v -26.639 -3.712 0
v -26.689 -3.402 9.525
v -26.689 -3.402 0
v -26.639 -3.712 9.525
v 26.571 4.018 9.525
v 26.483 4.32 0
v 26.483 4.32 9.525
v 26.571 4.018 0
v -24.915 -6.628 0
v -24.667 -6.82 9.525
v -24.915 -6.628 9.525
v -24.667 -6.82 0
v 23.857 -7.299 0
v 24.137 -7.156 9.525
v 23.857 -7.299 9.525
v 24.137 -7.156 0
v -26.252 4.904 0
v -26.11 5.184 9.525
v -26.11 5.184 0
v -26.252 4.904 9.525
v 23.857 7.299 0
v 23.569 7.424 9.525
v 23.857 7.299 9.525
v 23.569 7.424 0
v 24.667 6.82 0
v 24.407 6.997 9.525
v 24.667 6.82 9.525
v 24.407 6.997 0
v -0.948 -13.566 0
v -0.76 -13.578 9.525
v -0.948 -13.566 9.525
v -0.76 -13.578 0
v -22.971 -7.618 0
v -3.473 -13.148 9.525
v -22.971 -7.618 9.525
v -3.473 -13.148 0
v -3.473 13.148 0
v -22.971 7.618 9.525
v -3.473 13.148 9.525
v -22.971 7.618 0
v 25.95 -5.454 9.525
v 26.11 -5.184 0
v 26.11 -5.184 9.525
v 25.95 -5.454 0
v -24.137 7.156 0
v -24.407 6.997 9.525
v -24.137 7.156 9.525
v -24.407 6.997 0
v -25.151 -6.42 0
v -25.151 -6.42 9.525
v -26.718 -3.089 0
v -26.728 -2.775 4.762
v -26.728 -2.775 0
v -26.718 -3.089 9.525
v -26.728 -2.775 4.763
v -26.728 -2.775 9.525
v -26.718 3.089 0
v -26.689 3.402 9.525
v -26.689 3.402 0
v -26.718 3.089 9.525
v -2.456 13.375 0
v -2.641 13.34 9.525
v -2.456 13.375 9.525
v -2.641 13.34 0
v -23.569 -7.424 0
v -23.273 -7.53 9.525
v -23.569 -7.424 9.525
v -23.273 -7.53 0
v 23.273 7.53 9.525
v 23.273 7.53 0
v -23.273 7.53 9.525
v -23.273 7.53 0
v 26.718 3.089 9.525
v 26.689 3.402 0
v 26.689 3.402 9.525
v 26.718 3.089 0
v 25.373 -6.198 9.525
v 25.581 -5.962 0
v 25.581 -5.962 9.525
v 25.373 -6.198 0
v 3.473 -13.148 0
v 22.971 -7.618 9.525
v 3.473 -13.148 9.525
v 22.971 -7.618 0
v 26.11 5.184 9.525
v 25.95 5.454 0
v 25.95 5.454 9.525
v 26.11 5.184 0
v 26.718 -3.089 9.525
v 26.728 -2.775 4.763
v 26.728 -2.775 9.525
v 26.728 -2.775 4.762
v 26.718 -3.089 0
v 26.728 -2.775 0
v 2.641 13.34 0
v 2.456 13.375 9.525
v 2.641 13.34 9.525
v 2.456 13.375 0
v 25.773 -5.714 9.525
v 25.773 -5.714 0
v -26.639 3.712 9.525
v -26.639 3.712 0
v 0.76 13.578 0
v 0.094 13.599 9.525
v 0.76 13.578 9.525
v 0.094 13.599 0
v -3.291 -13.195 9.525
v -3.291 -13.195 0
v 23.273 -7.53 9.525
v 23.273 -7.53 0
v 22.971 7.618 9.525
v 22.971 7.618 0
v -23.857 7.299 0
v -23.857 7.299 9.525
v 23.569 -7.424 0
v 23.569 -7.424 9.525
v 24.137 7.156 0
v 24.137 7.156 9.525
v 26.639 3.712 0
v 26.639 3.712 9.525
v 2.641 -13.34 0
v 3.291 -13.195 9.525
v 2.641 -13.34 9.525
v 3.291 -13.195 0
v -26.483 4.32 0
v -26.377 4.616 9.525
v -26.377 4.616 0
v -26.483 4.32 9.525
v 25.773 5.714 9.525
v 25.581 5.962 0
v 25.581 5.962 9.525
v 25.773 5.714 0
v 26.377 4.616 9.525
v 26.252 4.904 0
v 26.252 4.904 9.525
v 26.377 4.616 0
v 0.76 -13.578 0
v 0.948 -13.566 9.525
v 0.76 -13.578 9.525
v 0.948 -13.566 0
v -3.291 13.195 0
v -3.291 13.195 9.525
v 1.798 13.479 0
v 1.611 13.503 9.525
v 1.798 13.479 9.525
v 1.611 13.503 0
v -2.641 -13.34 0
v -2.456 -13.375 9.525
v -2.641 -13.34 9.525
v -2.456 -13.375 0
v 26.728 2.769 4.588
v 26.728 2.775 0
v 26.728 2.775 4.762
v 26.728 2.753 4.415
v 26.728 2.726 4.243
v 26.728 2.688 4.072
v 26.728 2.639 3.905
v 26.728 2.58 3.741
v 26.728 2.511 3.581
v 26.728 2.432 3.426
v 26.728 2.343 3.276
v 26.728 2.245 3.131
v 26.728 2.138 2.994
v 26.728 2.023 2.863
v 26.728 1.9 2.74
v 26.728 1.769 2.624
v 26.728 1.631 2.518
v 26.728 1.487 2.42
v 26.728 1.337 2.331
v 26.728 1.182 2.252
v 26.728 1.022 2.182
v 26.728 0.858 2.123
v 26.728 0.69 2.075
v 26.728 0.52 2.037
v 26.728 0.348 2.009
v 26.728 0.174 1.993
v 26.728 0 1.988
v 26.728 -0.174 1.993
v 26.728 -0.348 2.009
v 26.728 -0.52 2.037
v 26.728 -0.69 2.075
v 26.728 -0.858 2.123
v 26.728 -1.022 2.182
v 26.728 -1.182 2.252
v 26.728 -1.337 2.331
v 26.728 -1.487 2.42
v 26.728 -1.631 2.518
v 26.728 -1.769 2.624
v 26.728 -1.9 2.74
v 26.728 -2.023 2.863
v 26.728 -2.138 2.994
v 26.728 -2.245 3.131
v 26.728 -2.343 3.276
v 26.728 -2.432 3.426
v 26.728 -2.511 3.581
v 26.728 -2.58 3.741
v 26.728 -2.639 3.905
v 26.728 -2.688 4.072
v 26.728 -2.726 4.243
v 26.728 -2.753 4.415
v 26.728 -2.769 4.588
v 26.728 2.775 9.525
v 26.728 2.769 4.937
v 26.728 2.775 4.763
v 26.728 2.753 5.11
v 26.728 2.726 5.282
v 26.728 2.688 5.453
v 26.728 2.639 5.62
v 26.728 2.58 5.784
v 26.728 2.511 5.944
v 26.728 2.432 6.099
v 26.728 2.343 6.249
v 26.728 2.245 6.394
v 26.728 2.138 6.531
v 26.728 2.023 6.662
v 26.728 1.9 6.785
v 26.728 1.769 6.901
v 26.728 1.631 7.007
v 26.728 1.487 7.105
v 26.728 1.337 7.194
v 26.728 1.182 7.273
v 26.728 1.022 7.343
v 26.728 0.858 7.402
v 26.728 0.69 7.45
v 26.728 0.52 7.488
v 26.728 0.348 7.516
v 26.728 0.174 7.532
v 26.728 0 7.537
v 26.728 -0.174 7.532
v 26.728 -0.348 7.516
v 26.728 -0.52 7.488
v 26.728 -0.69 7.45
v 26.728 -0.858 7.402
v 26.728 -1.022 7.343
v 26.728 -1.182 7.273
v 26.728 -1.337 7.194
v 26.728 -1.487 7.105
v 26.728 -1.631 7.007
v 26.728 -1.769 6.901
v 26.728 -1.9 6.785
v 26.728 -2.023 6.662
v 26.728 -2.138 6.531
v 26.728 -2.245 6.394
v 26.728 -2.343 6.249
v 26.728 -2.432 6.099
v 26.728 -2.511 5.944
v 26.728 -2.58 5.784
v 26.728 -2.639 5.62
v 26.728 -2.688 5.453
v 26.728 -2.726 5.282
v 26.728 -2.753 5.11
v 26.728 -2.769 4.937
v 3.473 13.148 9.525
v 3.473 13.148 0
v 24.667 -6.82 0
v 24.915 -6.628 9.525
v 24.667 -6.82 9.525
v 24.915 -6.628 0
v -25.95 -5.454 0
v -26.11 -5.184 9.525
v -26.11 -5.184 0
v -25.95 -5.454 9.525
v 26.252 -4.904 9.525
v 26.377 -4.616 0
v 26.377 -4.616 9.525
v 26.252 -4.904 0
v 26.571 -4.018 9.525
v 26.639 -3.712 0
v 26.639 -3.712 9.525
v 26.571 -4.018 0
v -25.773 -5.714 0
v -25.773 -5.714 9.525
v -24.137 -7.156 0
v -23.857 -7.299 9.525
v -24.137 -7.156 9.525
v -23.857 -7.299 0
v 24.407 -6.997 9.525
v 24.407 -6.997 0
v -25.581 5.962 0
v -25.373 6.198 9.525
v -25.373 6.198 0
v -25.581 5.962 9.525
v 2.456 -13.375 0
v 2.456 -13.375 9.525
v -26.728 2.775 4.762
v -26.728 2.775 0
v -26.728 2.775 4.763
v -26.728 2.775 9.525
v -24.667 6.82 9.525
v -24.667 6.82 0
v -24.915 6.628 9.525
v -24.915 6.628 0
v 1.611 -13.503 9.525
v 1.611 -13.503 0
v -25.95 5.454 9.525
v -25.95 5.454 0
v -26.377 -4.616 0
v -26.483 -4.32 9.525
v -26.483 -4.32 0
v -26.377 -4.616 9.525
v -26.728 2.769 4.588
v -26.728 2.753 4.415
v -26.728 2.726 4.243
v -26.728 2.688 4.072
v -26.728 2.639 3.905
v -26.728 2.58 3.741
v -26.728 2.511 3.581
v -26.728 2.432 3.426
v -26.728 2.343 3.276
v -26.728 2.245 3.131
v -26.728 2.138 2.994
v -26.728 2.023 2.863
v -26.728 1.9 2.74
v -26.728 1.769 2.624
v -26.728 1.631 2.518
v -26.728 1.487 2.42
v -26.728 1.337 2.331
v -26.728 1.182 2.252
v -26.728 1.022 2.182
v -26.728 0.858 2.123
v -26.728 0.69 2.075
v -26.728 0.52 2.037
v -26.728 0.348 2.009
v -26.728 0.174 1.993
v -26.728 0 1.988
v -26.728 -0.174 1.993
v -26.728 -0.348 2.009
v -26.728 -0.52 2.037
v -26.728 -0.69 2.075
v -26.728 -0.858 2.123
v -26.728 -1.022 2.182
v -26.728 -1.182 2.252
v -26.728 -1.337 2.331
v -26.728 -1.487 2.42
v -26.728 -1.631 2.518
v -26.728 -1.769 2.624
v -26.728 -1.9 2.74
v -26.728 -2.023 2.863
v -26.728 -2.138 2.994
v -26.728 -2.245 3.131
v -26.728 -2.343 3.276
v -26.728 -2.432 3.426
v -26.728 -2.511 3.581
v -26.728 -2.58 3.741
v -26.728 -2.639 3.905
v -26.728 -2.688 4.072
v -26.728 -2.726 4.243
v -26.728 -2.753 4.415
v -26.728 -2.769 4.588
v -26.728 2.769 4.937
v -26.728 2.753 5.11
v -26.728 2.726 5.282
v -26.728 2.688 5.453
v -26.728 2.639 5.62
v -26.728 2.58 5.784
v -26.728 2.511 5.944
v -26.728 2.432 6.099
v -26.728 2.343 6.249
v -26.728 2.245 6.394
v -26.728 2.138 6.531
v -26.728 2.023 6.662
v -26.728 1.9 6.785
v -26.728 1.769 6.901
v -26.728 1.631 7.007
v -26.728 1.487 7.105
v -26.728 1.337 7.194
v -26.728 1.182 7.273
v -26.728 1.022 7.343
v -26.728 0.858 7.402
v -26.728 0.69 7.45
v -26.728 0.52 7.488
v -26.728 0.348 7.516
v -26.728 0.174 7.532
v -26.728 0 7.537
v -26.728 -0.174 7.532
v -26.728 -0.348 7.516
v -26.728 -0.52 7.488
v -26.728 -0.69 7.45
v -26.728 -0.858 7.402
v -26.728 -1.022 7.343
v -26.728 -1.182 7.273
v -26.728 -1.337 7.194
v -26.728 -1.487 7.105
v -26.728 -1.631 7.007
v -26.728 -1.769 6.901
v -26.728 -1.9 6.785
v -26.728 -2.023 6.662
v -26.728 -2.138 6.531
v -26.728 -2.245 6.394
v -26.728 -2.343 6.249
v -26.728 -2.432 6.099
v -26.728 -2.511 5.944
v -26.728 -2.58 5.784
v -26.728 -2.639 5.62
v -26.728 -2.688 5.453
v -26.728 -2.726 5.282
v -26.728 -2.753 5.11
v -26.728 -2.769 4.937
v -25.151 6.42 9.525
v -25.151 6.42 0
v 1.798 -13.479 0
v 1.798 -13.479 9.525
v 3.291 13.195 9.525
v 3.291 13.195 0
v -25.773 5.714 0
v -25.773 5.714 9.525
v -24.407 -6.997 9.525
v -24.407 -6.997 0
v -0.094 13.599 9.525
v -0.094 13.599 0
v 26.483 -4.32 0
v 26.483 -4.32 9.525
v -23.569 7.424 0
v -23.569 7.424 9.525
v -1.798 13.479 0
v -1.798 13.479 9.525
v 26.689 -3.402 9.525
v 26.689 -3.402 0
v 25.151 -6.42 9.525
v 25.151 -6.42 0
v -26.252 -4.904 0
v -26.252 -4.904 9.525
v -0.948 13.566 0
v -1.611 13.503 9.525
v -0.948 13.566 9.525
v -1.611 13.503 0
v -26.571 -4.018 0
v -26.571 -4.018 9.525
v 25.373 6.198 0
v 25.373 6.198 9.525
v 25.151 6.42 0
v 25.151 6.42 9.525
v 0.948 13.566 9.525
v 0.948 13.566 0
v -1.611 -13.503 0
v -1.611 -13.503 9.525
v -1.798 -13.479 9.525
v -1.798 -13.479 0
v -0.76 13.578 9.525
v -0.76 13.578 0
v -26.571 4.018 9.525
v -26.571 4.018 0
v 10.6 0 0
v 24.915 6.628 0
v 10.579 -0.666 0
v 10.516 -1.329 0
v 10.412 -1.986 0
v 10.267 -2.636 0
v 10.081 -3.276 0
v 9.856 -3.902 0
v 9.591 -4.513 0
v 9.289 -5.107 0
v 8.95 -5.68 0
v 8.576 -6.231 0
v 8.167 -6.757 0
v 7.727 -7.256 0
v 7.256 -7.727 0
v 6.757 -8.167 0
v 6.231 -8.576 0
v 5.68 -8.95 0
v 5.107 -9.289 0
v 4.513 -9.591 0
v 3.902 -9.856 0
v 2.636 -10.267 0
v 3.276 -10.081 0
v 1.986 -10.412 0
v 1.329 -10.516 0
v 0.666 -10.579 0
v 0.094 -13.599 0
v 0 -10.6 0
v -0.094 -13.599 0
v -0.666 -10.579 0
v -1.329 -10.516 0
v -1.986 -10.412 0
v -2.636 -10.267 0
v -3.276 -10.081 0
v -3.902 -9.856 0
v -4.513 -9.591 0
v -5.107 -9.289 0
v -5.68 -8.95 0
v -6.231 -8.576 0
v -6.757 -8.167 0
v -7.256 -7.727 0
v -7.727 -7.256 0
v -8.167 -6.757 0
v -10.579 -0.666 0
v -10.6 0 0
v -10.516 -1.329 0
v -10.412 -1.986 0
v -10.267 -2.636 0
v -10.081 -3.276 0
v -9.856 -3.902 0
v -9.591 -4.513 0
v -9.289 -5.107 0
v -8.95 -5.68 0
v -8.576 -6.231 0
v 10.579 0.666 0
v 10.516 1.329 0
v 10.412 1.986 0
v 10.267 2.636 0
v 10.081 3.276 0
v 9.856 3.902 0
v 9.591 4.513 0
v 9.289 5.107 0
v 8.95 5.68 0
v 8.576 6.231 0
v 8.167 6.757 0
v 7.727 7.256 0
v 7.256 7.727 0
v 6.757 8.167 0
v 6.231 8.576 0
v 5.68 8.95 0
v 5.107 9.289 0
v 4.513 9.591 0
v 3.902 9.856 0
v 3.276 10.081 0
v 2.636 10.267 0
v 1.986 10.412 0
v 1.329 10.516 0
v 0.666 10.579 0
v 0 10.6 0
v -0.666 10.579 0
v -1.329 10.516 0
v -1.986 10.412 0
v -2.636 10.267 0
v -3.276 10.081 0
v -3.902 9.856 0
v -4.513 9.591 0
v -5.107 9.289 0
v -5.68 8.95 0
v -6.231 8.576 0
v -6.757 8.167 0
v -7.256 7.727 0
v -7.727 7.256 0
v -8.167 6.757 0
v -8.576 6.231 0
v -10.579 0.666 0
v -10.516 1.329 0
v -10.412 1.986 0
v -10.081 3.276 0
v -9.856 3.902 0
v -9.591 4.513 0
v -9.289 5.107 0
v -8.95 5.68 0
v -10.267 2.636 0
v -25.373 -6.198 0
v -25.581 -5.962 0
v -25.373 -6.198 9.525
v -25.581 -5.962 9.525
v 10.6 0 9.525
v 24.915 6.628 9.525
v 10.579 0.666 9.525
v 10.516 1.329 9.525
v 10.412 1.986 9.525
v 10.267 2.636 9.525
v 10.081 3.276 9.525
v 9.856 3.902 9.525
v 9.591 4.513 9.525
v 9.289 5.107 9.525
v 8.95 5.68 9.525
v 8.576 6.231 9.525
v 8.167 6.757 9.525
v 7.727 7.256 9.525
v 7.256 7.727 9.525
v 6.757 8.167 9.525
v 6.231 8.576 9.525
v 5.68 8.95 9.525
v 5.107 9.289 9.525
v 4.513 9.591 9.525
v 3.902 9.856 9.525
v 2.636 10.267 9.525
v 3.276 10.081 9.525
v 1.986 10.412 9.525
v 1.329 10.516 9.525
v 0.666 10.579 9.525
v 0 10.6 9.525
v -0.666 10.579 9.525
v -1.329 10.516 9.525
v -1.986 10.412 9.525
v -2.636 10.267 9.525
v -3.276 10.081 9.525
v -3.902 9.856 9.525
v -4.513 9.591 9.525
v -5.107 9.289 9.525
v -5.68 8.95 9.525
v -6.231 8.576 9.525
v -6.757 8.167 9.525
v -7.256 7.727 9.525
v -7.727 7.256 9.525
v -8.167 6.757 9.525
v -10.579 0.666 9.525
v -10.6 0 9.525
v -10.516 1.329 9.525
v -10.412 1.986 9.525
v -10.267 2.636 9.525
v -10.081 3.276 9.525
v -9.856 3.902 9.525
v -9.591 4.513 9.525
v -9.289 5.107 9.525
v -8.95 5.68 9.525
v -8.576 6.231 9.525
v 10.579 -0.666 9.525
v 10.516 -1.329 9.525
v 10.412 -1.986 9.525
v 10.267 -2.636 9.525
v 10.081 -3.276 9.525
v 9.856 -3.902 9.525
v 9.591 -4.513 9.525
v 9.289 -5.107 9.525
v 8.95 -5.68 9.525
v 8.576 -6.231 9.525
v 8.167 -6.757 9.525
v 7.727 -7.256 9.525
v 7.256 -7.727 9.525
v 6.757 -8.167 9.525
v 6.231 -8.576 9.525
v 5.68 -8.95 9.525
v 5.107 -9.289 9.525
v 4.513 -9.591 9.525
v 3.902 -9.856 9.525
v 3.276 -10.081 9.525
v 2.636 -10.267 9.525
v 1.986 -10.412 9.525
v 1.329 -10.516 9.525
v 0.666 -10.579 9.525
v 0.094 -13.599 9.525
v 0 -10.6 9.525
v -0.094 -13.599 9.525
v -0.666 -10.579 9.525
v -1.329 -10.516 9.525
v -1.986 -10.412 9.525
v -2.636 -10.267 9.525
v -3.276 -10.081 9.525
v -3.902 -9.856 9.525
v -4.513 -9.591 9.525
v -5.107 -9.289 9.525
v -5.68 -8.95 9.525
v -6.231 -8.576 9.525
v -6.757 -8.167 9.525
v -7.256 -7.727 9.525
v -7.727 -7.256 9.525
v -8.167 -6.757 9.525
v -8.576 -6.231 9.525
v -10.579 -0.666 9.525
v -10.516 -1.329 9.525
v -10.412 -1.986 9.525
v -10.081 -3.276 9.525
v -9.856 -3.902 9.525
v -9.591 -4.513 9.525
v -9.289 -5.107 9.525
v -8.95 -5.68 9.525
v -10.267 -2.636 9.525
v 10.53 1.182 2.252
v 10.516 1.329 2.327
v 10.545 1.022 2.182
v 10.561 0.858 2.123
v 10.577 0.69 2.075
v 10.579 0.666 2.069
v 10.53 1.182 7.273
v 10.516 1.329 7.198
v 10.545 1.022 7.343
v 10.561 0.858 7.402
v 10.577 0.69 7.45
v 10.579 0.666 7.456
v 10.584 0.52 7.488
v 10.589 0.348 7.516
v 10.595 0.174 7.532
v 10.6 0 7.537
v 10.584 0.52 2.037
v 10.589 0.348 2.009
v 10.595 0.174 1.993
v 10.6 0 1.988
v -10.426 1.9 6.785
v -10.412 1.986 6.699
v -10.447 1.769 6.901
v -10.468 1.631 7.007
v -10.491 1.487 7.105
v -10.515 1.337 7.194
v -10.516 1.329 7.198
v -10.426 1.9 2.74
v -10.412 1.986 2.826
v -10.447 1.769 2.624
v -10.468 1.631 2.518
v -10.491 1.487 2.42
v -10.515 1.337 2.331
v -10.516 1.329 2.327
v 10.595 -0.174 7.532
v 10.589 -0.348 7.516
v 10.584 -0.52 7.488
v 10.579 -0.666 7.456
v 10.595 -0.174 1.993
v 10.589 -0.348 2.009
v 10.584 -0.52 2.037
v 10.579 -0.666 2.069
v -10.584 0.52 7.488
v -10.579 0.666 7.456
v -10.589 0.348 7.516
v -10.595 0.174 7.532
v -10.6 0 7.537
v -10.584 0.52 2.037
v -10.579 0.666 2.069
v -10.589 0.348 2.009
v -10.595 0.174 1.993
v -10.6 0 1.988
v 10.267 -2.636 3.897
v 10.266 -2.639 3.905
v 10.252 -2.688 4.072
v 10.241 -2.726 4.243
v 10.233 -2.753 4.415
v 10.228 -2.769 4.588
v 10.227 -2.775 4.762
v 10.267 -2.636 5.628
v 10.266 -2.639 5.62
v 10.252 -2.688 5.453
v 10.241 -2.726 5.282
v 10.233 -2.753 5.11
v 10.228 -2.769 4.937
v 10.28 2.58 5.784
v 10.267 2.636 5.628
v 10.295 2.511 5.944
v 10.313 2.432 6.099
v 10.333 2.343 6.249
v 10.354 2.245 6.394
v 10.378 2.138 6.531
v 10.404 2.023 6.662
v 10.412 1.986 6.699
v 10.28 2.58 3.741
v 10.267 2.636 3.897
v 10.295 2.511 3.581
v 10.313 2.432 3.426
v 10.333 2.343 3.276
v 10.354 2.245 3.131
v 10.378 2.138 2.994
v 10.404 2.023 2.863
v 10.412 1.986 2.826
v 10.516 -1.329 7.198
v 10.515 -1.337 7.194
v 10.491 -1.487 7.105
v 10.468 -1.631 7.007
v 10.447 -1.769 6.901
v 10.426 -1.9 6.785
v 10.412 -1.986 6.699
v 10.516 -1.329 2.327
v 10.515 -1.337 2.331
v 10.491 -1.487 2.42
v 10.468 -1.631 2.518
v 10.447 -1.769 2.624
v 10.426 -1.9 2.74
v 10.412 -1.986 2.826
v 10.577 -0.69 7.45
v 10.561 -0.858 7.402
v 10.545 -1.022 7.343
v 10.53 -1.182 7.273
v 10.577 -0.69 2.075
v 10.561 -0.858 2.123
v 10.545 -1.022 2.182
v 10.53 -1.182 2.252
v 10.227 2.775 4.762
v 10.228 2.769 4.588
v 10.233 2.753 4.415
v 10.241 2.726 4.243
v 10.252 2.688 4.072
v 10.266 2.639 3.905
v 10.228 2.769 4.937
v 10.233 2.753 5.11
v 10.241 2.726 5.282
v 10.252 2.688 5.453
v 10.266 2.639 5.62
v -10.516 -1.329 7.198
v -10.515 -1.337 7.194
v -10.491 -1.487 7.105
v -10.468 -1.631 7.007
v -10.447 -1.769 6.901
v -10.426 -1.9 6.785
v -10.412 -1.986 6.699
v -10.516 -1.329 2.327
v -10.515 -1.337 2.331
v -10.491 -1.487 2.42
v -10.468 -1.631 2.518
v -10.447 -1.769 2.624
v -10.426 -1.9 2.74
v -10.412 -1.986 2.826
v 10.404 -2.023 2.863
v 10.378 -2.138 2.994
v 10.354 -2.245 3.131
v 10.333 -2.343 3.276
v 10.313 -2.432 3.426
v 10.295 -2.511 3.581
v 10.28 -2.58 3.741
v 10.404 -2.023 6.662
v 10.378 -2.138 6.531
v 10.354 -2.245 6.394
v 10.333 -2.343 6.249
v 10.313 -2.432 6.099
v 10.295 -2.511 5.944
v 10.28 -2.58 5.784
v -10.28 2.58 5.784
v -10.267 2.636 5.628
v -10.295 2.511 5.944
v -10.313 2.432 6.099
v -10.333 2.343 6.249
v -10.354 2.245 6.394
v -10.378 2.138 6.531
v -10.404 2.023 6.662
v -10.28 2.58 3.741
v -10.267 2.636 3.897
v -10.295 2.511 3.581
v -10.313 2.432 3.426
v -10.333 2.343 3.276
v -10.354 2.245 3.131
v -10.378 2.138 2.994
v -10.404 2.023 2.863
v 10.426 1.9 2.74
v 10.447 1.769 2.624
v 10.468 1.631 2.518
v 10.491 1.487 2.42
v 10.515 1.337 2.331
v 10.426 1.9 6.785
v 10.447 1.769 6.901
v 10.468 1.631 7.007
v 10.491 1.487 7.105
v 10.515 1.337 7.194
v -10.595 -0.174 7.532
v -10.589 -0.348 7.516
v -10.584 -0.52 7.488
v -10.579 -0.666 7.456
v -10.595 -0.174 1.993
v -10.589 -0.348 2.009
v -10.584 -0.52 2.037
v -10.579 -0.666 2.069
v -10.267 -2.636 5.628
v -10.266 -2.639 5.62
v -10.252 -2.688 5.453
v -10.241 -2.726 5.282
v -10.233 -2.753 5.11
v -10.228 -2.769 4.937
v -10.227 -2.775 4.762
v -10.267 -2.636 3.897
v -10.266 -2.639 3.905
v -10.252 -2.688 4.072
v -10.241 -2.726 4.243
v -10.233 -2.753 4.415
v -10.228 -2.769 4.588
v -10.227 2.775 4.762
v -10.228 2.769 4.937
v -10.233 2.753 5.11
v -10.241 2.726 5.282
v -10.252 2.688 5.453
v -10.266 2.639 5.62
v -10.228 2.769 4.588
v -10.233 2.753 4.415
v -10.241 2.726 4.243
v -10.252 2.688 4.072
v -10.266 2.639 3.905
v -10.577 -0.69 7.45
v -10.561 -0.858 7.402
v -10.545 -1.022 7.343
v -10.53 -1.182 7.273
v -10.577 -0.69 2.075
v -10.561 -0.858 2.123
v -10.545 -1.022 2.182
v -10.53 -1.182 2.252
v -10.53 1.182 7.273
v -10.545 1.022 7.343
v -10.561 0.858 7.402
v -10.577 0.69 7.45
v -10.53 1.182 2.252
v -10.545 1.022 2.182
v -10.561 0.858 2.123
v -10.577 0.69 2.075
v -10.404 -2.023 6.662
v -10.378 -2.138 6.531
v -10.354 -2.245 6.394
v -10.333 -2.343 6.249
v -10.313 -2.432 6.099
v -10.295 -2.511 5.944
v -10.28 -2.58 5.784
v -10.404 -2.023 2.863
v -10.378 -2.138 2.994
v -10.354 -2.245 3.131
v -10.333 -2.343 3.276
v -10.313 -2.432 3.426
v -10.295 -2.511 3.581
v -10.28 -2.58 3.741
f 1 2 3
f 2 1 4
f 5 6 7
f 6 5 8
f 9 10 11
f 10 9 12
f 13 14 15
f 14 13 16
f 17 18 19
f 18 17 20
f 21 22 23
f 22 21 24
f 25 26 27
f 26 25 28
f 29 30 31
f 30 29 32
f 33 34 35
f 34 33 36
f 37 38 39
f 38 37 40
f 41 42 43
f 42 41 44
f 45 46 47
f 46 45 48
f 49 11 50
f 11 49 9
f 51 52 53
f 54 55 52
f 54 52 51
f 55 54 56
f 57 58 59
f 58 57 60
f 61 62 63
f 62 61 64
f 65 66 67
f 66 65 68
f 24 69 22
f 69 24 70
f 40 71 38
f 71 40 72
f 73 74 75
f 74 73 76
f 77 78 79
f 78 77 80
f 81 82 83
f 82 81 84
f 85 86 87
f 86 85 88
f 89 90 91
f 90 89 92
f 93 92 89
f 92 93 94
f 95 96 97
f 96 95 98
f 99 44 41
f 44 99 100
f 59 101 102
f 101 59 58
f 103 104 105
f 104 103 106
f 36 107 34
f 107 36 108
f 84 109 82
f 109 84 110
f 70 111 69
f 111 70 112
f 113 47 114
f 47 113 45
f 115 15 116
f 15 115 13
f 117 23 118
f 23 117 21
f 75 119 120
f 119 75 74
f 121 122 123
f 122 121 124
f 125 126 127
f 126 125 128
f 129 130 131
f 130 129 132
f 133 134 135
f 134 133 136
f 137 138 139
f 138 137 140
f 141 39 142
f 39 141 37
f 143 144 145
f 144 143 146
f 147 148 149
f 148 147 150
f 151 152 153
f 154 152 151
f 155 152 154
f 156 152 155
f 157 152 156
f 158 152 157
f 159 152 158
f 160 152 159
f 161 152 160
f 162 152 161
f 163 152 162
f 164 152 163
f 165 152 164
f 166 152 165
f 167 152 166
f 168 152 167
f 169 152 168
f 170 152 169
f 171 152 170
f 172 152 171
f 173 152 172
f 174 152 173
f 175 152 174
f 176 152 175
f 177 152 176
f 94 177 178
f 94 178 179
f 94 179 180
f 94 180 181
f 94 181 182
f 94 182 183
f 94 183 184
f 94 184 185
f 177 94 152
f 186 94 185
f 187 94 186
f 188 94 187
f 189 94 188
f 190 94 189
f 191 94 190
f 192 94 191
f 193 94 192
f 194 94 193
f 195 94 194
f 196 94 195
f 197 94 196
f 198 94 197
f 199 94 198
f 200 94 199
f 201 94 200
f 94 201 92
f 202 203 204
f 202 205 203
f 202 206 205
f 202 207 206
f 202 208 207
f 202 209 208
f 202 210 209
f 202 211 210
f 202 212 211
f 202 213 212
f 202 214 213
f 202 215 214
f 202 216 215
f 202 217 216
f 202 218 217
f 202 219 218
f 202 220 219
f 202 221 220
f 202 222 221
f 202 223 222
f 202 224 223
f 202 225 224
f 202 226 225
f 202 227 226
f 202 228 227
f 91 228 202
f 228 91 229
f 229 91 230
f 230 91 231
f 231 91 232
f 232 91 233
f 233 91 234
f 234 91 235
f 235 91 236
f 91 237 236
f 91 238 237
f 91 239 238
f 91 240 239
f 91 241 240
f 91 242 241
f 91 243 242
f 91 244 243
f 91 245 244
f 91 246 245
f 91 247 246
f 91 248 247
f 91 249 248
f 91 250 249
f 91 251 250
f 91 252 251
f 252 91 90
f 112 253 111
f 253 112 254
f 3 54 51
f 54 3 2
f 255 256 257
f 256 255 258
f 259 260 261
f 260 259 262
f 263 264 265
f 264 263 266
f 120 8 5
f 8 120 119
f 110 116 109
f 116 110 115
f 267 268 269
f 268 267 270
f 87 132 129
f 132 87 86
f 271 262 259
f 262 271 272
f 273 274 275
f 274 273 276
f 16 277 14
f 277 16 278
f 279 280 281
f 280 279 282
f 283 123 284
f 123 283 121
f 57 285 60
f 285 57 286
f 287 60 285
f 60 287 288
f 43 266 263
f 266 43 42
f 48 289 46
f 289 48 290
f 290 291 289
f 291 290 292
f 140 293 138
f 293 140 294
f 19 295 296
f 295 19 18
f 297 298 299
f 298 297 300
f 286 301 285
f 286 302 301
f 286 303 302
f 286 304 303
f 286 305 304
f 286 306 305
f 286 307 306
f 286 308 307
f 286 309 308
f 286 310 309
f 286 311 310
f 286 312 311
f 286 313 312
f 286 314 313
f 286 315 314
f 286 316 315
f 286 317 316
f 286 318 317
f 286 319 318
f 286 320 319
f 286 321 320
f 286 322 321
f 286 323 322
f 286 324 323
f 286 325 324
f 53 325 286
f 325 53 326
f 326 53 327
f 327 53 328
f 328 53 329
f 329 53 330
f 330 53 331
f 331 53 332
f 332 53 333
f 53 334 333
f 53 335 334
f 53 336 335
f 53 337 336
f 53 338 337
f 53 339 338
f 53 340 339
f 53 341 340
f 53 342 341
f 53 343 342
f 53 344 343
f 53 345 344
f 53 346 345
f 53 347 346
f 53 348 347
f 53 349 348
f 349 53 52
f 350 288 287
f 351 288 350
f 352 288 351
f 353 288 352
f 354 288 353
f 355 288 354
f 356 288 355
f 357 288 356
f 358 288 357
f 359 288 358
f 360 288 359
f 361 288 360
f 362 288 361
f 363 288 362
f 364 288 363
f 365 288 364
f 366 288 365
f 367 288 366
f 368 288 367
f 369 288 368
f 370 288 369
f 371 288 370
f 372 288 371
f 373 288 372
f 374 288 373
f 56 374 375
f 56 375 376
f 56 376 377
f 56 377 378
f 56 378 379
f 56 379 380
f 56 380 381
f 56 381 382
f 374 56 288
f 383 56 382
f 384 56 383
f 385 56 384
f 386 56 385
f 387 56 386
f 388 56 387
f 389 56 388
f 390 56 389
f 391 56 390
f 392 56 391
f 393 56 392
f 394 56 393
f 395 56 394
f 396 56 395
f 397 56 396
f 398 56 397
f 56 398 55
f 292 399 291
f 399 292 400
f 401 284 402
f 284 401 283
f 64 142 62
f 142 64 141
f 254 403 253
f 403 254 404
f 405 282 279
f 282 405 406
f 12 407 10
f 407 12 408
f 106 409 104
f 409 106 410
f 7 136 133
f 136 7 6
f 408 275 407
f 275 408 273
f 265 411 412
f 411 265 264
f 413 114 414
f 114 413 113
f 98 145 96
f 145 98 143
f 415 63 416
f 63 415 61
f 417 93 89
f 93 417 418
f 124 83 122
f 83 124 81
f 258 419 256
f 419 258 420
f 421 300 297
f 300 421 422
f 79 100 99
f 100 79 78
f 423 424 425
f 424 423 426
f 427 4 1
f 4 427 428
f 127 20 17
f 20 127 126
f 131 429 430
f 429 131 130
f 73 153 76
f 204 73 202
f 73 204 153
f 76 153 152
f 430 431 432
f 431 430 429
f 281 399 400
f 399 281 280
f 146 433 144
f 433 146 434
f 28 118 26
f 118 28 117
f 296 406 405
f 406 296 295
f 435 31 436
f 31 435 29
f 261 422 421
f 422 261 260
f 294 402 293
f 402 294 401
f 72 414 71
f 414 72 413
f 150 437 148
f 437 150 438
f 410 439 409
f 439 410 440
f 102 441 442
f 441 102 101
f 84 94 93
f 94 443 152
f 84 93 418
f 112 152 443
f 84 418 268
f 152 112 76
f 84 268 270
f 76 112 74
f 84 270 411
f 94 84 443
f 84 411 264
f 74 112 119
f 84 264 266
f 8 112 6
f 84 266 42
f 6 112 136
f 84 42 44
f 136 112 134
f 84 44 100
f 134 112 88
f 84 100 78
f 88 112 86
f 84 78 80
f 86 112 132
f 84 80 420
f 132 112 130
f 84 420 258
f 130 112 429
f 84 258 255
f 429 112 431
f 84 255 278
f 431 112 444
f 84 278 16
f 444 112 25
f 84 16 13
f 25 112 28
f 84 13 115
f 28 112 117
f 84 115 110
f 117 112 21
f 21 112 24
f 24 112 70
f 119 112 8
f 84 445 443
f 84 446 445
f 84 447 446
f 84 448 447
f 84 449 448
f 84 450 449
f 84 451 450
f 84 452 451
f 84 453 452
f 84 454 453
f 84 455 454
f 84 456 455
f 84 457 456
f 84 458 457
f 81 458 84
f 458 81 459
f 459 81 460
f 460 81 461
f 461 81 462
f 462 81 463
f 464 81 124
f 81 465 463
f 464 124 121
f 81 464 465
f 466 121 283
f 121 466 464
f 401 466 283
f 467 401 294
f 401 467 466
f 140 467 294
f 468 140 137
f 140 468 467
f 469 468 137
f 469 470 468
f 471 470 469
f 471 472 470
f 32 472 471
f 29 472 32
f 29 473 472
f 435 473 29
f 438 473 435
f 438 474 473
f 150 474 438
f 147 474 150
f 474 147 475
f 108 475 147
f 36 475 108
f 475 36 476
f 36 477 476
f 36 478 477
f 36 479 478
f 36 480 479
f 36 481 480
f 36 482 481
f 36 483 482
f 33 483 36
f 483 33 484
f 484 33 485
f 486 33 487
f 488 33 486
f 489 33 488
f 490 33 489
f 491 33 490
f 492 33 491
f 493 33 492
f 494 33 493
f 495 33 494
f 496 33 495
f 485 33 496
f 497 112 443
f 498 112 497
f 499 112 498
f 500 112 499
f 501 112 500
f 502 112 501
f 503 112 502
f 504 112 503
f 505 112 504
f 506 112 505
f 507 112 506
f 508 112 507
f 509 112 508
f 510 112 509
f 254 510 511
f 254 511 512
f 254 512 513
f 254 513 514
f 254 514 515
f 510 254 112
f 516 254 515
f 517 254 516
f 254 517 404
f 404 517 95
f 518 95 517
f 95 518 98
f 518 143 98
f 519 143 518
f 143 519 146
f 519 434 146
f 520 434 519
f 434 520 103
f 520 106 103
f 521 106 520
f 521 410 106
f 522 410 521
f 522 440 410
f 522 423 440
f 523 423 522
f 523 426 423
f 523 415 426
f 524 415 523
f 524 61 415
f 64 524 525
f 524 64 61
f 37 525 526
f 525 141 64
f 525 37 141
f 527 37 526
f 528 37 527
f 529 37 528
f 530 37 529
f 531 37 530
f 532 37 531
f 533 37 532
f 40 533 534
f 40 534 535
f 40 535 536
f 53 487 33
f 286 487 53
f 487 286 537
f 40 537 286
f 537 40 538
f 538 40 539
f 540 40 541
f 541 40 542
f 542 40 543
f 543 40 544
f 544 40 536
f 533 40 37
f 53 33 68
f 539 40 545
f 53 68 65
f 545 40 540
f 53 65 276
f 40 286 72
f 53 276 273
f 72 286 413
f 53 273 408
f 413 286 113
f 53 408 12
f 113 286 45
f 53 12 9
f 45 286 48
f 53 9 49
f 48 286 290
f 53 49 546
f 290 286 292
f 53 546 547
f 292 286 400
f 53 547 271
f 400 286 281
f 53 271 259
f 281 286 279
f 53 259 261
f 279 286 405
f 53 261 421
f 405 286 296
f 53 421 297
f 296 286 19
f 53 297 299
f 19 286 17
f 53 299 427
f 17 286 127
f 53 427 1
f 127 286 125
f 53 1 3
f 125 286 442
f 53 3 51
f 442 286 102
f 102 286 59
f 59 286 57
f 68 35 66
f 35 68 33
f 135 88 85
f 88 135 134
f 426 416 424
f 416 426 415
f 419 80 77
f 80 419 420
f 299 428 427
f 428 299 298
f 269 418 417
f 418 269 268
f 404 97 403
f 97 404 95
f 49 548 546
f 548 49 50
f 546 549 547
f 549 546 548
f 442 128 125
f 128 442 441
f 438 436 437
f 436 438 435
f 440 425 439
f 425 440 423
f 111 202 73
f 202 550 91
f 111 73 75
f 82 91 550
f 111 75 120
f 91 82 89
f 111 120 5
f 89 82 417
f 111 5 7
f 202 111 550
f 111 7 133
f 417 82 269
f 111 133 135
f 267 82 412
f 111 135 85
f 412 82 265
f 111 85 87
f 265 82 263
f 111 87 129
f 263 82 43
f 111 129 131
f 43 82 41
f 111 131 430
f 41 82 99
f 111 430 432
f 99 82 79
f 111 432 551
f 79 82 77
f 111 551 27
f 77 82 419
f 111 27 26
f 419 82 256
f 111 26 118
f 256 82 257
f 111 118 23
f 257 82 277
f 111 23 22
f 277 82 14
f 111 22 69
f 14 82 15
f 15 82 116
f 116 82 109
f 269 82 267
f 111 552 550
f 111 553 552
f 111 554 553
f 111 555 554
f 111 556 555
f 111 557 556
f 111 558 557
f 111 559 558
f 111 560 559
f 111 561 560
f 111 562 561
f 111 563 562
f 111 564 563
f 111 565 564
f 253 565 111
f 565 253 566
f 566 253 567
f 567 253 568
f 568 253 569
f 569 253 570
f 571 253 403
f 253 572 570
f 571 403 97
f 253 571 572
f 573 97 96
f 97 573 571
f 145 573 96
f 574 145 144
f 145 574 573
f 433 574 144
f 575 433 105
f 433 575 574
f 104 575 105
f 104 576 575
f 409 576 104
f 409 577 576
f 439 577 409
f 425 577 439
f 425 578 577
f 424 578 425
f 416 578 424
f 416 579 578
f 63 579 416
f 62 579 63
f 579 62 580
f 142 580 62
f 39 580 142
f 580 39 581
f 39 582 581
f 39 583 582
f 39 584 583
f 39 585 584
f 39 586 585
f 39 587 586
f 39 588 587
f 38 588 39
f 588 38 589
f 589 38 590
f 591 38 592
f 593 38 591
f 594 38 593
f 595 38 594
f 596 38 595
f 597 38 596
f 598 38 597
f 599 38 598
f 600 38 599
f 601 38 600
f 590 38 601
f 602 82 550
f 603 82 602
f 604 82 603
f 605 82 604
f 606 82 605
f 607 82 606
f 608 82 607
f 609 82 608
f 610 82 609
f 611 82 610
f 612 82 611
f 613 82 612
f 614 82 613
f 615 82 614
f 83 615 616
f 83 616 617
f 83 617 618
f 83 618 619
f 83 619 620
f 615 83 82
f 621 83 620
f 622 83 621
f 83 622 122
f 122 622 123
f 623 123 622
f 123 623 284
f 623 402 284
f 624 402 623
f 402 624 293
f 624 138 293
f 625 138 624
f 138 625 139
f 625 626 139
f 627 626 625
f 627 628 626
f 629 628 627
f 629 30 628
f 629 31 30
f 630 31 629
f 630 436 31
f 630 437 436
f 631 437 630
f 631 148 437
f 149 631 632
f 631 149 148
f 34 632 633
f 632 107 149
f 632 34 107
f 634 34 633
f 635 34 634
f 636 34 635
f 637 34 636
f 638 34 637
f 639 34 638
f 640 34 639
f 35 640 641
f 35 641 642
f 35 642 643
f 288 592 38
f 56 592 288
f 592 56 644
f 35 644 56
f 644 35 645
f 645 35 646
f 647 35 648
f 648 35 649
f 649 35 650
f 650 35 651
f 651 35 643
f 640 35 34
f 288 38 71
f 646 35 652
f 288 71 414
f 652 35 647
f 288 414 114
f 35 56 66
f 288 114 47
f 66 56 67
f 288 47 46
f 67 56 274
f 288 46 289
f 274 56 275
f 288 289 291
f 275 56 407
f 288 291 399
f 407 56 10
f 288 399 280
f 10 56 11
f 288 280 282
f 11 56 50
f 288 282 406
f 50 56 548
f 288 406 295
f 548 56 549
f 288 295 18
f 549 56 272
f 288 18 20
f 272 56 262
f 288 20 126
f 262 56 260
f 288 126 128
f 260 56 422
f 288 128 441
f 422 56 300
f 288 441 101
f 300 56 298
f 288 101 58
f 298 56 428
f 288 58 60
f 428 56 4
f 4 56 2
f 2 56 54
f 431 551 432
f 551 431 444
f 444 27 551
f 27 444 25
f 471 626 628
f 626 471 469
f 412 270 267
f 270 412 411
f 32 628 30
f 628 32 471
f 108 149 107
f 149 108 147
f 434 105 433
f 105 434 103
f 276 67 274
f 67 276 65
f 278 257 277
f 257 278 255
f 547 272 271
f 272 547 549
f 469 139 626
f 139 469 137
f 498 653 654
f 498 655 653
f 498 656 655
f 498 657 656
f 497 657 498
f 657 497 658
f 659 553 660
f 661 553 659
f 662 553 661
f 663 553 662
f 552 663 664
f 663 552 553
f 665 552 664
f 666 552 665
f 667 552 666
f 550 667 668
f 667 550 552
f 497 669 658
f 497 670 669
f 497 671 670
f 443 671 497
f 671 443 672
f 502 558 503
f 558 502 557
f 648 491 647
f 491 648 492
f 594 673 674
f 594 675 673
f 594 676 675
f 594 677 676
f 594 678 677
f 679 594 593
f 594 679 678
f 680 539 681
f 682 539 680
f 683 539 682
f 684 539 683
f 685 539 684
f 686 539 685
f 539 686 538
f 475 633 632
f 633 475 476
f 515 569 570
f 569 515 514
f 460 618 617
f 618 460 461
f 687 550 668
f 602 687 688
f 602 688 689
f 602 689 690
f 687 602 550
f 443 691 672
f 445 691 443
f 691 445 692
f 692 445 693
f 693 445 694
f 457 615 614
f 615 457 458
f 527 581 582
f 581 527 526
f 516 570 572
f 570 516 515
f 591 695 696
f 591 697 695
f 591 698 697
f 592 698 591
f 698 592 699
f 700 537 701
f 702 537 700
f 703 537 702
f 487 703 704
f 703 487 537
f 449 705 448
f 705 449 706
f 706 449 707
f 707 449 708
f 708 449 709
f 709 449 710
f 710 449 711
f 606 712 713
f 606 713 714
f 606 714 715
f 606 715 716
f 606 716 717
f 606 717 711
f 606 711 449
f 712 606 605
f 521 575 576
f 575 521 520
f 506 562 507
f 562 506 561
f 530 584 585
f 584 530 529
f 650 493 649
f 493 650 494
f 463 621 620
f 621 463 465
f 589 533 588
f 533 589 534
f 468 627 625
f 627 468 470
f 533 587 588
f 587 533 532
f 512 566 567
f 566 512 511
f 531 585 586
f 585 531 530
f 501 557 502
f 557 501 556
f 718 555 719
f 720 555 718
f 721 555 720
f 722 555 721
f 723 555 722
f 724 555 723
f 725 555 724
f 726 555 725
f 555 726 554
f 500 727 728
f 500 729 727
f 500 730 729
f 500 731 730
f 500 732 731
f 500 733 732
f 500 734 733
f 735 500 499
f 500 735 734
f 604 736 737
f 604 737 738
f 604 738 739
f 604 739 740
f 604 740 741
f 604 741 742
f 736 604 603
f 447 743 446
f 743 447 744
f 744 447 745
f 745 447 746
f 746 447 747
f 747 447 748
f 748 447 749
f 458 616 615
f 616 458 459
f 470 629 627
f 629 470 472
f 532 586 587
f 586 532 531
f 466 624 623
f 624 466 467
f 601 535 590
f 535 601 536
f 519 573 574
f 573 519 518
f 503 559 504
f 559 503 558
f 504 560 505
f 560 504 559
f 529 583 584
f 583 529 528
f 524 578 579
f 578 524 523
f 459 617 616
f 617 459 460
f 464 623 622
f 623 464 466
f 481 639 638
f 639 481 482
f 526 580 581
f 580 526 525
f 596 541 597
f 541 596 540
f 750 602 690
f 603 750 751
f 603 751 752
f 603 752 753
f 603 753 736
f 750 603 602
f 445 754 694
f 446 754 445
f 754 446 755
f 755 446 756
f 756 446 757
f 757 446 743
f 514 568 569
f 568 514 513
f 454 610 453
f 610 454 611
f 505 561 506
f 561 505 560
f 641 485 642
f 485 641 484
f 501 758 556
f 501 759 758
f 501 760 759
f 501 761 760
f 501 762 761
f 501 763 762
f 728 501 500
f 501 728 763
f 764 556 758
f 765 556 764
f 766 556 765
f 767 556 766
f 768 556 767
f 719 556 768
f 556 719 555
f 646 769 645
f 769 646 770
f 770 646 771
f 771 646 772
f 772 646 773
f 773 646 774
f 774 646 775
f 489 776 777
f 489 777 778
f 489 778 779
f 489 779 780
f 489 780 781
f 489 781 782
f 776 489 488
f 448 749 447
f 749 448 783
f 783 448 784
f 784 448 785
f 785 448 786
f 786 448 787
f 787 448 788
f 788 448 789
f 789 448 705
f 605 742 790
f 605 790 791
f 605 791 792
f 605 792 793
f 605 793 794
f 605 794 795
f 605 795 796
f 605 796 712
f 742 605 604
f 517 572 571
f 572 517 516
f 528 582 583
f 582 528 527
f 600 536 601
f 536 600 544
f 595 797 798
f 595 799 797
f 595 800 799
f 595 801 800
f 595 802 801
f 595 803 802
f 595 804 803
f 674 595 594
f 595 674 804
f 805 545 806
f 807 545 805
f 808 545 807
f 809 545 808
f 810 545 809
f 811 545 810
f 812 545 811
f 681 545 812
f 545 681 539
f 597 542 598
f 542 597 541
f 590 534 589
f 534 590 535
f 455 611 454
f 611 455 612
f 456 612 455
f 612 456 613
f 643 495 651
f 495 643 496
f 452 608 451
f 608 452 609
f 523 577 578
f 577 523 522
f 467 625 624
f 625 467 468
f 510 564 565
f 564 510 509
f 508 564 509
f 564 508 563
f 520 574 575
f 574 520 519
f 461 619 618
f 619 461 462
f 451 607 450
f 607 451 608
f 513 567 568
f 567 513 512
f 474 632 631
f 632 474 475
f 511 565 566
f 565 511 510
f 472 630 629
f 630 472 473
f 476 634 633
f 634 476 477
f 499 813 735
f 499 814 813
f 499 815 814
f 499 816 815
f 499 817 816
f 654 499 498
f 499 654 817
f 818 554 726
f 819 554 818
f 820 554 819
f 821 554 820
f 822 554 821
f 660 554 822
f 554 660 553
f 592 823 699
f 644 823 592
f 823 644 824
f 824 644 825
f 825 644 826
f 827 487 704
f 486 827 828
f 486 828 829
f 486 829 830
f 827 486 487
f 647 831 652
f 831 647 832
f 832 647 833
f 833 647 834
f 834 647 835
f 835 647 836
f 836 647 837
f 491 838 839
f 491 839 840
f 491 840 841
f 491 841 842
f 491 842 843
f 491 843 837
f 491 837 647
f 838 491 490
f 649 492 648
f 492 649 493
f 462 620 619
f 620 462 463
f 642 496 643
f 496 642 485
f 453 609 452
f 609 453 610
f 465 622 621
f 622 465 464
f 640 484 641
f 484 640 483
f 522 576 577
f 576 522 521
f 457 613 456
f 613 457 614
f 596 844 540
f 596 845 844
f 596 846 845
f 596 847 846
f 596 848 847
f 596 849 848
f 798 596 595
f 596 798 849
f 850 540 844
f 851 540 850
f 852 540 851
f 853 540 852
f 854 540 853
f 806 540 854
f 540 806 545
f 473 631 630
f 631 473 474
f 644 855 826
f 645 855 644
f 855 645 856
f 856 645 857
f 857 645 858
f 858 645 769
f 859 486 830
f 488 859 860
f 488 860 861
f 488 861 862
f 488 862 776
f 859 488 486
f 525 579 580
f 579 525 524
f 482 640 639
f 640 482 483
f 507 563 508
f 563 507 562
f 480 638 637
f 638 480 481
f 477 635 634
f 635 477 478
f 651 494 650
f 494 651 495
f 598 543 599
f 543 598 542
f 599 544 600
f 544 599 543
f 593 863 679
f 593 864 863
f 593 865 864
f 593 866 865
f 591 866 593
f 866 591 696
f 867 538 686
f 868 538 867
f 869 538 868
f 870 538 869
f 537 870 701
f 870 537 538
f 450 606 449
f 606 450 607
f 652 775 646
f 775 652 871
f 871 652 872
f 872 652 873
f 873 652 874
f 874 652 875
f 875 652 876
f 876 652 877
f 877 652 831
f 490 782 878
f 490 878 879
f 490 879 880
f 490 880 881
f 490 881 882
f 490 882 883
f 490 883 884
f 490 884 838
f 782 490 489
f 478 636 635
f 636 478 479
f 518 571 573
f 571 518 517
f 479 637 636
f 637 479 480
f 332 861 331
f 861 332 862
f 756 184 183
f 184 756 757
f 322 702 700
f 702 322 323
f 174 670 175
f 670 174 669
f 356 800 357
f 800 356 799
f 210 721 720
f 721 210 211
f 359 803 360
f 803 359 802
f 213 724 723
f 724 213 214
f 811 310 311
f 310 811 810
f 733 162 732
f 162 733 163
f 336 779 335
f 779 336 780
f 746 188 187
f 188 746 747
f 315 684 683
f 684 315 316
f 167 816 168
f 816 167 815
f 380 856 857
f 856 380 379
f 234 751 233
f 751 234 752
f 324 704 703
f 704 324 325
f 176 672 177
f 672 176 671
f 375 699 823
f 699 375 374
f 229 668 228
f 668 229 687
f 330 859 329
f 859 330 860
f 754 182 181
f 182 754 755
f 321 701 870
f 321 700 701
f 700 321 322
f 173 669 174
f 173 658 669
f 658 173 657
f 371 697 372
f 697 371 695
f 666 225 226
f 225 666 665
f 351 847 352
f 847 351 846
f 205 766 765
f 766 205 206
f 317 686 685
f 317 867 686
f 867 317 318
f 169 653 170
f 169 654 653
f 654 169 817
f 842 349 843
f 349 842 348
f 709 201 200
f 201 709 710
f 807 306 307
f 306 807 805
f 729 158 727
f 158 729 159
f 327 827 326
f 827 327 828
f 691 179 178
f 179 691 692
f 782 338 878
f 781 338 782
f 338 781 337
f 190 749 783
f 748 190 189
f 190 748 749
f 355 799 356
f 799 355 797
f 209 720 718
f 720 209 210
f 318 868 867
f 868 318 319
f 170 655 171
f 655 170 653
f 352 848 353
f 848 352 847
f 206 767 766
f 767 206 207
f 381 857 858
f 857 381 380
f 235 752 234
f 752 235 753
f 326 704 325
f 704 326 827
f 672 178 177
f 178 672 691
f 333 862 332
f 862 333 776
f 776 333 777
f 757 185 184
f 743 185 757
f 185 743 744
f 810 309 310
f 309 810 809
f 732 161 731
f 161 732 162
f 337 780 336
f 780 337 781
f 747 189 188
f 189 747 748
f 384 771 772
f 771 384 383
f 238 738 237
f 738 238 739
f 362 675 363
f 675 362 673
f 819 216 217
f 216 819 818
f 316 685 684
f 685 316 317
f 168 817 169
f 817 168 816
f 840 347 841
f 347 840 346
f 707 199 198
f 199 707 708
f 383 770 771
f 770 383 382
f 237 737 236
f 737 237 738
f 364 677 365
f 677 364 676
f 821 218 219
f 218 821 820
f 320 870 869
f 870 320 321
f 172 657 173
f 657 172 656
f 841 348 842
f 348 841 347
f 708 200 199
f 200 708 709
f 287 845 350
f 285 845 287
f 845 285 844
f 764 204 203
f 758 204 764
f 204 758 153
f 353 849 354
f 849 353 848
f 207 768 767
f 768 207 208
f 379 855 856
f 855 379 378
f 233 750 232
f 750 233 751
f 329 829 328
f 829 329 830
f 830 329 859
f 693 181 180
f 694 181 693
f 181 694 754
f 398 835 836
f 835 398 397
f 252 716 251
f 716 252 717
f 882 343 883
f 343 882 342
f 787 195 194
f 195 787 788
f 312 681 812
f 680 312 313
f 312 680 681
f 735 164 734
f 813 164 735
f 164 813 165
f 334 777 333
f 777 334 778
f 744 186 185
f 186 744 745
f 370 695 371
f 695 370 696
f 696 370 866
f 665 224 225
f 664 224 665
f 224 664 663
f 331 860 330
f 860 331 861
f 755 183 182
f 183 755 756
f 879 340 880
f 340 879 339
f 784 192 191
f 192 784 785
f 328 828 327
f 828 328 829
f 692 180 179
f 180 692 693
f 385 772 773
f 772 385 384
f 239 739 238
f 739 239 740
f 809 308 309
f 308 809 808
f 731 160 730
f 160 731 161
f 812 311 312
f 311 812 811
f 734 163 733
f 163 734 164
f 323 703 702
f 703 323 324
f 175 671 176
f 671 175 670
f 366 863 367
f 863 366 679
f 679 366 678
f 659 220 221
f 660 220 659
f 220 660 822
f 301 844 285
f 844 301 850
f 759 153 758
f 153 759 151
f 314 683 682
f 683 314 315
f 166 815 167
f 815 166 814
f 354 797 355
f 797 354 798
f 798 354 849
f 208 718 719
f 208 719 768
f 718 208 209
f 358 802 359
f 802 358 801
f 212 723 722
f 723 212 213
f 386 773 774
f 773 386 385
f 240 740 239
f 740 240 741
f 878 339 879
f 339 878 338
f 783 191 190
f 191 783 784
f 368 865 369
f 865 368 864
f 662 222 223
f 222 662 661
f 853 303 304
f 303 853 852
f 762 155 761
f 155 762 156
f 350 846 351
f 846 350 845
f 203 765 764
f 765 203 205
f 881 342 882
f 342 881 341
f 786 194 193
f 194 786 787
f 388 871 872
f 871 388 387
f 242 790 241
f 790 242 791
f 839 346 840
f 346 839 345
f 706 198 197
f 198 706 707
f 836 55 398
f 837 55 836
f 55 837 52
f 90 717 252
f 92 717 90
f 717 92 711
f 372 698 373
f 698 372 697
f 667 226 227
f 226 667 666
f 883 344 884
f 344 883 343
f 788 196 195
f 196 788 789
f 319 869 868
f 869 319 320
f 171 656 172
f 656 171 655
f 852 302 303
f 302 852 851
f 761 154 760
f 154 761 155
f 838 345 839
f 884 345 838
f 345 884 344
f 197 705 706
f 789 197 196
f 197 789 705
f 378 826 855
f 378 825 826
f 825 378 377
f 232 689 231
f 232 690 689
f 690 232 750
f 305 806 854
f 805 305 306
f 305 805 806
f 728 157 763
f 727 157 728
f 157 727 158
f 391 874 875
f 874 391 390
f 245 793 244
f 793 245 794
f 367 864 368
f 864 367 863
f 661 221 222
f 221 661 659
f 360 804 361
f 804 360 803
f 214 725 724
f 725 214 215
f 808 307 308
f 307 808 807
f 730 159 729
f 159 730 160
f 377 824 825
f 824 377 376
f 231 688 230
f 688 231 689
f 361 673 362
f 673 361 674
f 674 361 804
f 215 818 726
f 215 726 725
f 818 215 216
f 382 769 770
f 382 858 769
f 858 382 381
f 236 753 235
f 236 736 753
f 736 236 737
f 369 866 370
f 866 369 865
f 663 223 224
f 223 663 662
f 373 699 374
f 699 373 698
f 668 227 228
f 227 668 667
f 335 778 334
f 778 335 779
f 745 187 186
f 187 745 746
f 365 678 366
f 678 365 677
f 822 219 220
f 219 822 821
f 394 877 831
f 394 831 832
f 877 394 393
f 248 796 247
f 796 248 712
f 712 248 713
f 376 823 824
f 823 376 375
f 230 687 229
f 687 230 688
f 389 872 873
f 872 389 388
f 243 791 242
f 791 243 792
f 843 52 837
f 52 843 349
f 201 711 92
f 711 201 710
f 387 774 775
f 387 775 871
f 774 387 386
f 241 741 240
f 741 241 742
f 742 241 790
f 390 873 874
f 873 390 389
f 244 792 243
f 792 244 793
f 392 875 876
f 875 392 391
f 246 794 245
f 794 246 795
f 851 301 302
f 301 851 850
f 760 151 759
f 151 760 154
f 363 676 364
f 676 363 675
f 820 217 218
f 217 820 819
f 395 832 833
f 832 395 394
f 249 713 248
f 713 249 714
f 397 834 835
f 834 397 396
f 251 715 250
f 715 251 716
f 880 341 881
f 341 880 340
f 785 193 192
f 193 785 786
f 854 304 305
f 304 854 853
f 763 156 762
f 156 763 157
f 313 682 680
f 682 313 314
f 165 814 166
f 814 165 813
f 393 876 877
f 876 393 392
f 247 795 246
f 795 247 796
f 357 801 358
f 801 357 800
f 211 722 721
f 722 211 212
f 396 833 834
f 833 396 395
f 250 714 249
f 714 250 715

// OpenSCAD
// adapt camera to a post mount; camera mounts like thorlabs FM series
// 8-32 press fit threads for post adapter, camera lock (rubber tip)

$fn=100;
inch=25.4;

cd = 21.2; // hole diameter for camera
// smount has 21.0 mm diameter
// cmount has 27.8 mm diameter

csm1 = 1.2*inch; // hole diameter for sm1 mount

post_d = 0.2185*inch; // hole diameter for post mount
post_depth = 0.32*inch; 

thickness = 0.375*inch;

module SMountHolder(height, radius, post_radius, post_depth) {
  linear_extrude(height=height)
  hull() {
    offset(3){
      circle(radius);
    }
    for (fi=[-1,1]){  // put on both sides
      translate([fi*(radius+3),0,0])
      offset(5){
        polygon([
          [0, -post_radius],
          [0, post_radius],
          [fi*post_depth, post_radius],
          [fi*post_depth, -post_radius]
        ]);
      }
    }
  }
}

difference(){
  SMountHolder(thickness, cd/2, post_d/2, post_depth);
  cylinder(thickness, r=cd/2);
  translate([0,0,thickness/2])
  rotate([0,90,0])
  cylinder(100, r=post_d/2, center=true);


}
